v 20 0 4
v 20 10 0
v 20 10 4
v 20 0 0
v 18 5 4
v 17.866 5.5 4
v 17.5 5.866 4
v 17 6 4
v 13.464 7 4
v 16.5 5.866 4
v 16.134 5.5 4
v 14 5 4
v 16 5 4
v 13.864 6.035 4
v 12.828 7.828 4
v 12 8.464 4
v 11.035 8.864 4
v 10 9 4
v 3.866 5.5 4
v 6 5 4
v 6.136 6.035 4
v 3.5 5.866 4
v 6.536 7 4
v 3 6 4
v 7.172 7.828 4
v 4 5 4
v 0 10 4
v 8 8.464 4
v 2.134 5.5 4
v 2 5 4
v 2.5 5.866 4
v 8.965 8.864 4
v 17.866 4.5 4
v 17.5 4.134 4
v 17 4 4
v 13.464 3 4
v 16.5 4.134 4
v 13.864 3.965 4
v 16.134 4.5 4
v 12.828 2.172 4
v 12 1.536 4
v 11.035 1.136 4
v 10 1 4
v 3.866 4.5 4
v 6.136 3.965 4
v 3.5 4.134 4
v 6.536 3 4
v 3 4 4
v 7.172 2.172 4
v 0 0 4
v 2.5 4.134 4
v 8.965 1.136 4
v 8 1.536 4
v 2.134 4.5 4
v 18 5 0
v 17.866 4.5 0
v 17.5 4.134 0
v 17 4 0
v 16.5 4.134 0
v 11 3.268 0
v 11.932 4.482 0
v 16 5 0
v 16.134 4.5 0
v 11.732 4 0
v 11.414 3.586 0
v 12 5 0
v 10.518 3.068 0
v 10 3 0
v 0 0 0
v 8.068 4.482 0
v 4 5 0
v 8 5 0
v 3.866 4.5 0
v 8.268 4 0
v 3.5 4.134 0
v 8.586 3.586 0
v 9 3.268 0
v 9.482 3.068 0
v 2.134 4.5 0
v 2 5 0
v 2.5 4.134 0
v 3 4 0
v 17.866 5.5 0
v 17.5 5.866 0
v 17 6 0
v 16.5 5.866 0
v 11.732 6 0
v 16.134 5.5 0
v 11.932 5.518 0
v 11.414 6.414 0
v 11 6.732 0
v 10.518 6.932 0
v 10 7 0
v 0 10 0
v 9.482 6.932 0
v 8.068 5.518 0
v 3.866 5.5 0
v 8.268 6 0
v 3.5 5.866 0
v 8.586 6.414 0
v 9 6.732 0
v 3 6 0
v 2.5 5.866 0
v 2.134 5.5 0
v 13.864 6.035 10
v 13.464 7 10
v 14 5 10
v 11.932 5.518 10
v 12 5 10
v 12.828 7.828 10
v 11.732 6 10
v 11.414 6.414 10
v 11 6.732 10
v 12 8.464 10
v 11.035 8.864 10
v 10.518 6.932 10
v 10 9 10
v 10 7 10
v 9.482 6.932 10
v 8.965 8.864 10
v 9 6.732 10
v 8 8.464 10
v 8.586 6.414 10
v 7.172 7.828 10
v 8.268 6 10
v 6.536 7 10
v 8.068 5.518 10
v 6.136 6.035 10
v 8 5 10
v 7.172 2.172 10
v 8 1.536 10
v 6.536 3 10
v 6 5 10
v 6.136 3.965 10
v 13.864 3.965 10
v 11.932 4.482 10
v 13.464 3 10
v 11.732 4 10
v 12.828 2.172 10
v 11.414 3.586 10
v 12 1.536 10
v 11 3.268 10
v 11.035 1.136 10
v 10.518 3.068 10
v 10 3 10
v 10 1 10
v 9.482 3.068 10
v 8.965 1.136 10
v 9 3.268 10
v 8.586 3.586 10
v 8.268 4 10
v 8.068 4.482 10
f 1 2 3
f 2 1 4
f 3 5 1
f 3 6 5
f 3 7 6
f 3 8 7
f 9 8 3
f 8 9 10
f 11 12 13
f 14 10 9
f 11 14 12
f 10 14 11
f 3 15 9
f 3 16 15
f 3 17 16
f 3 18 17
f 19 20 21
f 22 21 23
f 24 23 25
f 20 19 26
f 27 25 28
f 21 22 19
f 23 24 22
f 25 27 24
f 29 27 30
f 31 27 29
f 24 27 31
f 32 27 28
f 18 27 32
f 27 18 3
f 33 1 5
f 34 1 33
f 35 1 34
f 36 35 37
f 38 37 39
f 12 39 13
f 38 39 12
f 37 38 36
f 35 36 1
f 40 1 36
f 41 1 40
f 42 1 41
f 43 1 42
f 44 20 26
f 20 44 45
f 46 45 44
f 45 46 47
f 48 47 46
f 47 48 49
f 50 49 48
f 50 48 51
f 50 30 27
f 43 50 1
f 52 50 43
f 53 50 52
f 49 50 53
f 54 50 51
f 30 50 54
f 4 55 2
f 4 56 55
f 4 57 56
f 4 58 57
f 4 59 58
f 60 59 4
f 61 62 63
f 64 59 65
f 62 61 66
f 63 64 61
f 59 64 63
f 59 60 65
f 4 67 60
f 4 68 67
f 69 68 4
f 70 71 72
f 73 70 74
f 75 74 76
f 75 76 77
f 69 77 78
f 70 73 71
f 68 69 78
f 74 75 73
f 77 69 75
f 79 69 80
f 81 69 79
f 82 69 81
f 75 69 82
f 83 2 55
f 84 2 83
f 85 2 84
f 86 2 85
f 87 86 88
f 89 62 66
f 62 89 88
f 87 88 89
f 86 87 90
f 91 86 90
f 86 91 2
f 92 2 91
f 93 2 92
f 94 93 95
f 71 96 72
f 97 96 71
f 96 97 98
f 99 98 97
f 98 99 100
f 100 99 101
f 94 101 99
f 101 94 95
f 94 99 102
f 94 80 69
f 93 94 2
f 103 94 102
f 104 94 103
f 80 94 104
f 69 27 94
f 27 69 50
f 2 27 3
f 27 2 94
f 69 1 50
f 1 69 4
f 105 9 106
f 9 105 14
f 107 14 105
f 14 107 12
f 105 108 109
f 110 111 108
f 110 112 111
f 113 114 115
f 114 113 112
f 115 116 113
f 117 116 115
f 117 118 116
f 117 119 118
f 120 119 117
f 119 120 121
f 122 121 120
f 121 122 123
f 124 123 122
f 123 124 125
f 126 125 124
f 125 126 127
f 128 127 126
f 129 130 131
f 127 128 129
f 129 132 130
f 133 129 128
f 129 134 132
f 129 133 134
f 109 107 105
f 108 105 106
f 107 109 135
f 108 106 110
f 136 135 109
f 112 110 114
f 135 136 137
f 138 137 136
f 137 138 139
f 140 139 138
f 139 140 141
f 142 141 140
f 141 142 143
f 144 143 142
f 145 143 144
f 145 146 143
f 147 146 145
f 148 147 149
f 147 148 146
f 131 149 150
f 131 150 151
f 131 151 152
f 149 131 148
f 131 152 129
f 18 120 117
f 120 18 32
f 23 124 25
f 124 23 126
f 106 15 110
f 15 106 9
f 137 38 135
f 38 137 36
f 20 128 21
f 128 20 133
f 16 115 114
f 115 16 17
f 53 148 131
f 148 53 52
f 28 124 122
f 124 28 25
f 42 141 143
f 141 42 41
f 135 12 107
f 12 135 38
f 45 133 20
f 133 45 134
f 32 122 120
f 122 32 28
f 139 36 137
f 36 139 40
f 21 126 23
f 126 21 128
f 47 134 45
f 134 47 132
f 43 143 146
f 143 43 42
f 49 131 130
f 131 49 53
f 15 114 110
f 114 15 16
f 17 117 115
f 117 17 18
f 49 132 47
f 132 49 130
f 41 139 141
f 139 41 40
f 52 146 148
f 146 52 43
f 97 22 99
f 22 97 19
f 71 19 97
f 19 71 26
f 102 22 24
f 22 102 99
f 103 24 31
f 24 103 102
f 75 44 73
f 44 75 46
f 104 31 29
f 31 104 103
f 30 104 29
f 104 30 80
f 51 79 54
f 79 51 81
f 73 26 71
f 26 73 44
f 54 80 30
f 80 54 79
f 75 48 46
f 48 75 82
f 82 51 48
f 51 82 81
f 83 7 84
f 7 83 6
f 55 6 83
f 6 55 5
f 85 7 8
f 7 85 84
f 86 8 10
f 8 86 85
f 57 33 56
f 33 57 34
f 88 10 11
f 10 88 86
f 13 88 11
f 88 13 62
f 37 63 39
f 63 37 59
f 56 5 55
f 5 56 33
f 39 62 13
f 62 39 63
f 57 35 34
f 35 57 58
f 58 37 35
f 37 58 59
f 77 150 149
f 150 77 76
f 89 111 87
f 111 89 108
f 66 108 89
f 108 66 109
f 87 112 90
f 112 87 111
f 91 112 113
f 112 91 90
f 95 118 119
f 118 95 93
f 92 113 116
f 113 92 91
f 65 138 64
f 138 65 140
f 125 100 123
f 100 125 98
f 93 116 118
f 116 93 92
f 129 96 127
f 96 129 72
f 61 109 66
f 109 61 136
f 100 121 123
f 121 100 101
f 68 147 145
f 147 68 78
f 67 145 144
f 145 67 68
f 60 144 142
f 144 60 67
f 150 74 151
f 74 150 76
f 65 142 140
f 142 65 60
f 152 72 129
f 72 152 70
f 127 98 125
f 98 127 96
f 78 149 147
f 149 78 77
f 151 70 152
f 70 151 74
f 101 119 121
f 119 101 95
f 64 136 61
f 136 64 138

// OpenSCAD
// nested booleans
difference() {
  union() {
    cube([20, 10, 4]);
    translate([10, 5, 0]) cylinder(h = 10, r = 4, $fn = 24);
  }
  translate([10, 5, -1]) cylinder(h = 12, r = 2, $fn = 24);
  for (x = [3, 17]) translate([x, 5, -1]) cylinder(h = 6, r = 1, $fn = 12);
}
